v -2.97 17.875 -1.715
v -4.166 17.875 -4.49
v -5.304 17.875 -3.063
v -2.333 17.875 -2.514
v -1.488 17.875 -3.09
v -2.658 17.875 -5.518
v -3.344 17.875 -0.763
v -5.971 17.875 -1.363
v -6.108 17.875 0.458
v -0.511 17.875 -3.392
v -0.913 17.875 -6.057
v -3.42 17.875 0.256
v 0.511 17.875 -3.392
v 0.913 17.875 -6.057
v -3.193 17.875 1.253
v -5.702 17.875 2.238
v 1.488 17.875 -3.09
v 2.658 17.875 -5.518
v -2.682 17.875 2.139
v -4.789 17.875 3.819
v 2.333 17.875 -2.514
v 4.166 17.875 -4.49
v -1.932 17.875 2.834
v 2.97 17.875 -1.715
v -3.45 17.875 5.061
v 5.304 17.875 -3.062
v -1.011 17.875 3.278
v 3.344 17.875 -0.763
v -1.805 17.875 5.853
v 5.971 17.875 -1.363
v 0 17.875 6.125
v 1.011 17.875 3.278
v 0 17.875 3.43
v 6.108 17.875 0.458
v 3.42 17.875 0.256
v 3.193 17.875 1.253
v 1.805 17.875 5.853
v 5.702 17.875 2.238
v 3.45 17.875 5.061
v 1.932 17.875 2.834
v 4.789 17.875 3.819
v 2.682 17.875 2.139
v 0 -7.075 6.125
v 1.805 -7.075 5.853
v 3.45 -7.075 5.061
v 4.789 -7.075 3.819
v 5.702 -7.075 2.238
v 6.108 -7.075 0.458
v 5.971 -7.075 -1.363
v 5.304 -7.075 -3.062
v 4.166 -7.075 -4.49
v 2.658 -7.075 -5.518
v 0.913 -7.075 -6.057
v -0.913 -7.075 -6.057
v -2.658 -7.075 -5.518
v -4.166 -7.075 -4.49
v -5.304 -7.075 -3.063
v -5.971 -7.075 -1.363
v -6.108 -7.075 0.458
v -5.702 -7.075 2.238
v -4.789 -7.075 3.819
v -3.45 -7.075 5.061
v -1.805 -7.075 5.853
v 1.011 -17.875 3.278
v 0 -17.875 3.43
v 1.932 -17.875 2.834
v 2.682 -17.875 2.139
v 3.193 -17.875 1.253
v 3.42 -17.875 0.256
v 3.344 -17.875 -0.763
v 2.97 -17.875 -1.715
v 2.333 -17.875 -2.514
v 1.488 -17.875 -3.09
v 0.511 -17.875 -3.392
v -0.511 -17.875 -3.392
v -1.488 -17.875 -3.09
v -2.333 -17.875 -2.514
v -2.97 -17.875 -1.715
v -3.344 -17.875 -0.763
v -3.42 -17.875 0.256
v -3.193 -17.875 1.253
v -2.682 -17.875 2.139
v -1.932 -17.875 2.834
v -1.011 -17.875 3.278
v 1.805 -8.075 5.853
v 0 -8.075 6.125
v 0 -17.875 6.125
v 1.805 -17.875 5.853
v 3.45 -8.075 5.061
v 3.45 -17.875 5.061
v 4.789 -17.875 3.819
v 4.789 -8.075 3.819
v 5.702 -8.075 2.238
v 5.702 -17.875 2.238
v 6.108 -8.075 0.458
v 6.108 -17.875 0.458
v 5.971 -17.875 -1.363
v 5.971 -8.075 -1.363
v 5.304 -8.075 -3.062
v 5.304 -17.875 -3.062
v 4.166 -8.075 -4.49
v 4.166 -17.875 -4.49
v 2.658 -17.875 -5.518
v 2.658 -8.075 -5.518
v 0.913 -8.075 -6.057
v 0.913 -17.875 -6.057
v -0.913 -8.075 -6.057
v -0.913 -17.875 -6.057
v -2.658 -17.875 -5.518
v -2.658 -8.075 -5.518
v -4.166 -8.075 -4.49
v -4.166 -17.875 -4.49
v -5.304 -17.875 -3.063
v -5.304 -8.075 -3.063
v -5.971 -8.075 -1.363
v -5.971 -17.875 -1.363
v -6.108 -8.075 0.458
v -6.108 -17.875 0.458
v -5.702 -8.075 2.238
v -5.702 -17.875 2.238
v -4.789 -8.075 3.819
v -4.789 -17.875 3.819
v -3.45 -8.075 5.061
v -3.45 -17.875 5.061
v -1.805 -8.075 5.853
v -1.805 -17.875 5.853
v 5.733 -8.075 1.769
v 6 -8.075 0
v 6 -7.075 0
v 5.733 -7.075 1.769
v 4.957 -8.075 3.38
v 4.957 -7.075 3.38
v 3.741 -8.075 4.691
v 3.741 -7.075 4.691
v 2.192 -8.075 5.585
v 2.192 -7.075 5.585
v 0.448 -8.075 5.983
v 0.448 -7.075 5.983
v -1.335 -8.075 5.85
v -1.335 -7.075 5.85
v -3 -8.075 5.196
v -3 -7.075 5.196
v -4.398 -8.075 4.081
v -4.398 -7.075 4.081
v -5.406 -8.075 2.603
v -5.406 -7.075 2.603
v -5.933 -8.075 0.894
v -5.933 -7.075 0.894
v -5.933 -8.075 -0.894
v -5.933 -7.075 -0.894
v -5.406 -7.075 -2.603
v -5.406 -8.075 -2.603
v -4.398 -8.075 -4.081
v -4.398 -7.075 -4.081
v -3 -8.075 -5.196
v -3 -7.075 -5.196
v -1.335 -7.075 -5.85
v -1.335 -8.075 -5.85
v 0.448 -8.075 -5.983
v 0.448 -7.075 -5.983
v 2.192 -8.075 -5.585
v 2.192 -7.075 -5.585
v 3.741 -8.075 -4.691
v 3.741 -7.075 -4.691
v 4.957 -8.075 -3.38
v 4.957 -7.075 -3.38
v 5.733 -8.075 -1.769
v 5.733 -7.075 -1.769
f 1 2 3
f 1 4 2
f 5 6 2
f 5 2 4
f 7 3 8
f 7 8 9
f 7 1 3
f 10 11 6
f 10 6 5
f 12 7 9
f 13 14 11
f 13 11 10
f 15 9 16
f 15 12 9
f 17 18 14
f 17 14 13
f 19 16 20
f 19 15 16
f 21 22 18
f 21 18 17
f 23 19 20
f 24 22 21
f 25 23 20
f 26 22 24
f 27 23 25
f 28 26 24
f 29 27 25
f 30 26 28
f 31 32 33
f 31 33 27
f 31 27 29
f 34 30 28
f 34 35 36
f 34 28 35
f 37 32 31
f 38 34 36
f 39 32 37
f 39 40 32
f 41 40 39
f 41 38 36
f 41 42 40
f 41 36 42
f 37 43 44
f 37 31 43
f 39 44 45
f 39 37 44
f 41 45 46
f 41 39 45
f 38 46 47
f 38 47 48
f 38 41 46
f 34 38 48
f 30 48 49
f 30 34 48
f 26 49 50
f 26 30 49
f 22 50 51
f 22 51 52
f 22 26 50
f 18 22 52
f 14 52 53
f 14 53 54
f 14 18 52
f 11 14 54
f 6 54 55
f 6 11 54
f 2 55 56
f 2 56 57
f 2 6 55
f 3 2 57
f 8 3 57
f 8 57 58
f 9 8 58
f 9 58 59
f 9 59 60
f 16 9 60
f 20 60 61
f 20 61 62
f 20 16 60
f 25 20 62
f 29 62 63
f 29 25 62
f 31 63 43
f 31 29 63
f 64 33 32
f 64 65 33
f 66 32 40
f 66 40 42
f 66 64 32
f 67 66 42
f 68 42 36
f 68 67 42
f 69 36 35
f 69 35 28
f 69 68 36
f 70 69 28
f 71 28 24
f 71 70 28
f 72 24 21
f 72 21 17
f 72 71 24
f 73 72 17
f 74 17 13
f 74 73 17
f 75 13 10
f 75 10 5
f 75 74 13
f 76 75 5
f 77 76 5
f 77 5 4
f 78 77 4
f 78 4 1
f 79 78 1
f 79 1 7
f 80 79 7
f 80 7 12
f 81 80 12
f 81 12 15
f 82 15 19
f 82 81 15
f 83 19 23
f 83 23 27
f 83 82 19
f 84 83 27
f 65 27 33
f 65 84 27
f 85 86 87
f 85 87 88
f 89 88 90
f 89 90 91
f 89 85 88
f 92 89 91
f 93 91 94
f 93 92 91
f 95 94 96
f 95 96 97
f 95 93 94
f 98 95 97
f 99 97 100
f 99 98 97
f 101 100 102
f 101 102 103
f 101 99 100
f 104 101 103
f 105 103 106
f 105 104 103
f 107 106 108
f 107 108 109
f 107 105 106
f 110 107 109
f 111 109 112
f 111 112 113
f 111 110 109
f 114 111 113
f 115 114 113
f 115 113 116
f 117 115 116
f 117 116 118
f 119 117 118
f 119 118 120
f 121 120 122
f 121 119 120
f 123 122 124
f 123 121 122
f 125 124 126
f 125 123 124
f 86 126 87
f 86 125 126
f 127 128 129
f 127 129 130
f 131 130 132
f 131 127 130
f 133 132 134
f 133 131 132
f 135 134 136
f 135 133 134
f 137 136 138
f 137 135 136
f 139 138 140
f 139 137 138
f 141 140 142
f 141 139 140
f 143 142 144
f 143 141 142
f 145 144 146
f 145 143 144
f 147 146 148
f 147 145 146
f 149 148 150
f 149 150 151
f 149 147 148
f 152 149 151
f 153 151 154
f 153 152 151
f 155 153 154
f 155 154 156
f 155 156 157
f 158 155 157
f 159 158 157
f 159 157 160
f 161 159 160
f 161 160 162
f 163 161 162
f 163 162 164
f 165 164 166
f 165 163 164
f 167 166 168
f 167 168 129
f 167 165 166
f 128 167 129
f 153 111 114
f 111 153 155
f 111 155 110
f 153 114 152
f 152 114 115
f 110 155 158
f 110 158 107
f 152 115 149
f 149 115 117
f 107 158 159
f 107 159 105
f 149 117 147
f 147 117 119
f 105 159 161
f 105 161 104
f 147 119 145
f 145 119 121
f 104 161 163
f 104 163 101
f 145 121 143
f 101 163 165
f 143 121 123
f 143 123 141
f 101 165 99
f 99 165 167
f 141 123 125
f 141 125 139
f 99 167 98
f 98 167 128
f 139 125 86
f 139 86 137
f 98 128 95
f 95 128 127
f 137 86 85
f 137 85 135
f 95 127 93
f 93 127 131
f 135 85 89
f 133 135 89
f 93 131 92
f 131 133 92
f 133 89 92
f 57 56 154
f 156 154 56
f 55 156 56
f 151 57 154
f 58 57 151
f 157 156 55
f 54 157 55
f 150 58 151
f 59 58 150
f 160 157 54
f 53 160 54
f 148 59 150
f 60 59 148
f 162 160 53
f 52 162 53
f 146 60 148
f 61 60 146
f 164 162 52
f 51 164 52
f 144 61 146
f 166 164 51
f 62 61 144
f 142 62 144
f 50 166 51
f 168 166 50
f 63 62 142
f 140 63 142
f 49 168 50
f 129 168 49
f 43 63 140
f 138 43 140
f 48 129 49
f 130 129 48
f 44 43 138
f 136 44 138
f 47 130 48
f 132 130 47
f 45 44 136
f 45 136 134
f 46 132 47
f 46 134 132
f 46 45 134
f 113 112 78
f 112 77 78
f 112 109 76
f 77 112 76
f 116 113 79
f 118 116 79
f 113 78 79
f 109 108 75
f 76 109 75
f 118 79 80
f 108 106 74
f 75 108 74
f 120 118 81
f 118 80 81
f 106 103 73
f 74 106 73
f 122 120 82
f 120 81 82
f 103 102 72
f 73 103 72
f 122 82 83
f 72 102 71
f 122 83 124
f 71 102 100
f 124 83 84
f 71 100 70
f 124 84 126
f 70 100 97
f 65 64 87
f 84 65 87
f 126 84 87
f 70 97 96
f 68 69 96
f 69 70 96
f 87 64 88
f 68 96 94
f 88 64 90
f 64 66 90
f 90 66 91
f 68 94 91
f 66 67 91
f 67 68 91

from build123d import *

# Parameters (mm, degrees)
SKETCH1_R               = 6.125
SKETCH1_R_2             = 3.43
BOSS_EXTRUDE1_DEPTH     = 17.875
CUT_EXTRUDE_THIN1_START = -9.8
SKETCH2_R               = 6.5
SKETCH2_R_2             = 6
CUT_EXTRUDE_THIN1_DEPTH = 1


with BuildPart() as part:
    # Sketch1 → Boss-Extrude1 (new, symmetric)
    with BuildSketch(Plane(origin=(0, 0, 0), x_dir=(1, 0, 0), z_dir=(0, 1, 0))):
        with Locations(Location((0, 0, 0), (0, 0, 270))):
            Circle(SKETCH1_R)
        with Locations(Location((0, 0, 0), (0, 0, 270))):
            Circle(SKETCH1_R_2, mode=Mode.SUBTRACT)
    extrude(amount=BOSS_EXTRUDE1_DEPTH, both=True)

    # Sketch2 → Cut-Extrude-Thin1 (cut)
    with BuildSketch(Plane.XZ.offset(17.875).offset(CUT_EXTRUDE_THIN1_START)):
        Circle(SKETCH2_R)
        Circle(SKETCH2_R_2, mode=Mode.SUBTRACT)
    extrude(amount=-CUT_EXTRUDE_THIN1_DEPTH, mode=Mode.SUBTRACT)


solid = part.part
